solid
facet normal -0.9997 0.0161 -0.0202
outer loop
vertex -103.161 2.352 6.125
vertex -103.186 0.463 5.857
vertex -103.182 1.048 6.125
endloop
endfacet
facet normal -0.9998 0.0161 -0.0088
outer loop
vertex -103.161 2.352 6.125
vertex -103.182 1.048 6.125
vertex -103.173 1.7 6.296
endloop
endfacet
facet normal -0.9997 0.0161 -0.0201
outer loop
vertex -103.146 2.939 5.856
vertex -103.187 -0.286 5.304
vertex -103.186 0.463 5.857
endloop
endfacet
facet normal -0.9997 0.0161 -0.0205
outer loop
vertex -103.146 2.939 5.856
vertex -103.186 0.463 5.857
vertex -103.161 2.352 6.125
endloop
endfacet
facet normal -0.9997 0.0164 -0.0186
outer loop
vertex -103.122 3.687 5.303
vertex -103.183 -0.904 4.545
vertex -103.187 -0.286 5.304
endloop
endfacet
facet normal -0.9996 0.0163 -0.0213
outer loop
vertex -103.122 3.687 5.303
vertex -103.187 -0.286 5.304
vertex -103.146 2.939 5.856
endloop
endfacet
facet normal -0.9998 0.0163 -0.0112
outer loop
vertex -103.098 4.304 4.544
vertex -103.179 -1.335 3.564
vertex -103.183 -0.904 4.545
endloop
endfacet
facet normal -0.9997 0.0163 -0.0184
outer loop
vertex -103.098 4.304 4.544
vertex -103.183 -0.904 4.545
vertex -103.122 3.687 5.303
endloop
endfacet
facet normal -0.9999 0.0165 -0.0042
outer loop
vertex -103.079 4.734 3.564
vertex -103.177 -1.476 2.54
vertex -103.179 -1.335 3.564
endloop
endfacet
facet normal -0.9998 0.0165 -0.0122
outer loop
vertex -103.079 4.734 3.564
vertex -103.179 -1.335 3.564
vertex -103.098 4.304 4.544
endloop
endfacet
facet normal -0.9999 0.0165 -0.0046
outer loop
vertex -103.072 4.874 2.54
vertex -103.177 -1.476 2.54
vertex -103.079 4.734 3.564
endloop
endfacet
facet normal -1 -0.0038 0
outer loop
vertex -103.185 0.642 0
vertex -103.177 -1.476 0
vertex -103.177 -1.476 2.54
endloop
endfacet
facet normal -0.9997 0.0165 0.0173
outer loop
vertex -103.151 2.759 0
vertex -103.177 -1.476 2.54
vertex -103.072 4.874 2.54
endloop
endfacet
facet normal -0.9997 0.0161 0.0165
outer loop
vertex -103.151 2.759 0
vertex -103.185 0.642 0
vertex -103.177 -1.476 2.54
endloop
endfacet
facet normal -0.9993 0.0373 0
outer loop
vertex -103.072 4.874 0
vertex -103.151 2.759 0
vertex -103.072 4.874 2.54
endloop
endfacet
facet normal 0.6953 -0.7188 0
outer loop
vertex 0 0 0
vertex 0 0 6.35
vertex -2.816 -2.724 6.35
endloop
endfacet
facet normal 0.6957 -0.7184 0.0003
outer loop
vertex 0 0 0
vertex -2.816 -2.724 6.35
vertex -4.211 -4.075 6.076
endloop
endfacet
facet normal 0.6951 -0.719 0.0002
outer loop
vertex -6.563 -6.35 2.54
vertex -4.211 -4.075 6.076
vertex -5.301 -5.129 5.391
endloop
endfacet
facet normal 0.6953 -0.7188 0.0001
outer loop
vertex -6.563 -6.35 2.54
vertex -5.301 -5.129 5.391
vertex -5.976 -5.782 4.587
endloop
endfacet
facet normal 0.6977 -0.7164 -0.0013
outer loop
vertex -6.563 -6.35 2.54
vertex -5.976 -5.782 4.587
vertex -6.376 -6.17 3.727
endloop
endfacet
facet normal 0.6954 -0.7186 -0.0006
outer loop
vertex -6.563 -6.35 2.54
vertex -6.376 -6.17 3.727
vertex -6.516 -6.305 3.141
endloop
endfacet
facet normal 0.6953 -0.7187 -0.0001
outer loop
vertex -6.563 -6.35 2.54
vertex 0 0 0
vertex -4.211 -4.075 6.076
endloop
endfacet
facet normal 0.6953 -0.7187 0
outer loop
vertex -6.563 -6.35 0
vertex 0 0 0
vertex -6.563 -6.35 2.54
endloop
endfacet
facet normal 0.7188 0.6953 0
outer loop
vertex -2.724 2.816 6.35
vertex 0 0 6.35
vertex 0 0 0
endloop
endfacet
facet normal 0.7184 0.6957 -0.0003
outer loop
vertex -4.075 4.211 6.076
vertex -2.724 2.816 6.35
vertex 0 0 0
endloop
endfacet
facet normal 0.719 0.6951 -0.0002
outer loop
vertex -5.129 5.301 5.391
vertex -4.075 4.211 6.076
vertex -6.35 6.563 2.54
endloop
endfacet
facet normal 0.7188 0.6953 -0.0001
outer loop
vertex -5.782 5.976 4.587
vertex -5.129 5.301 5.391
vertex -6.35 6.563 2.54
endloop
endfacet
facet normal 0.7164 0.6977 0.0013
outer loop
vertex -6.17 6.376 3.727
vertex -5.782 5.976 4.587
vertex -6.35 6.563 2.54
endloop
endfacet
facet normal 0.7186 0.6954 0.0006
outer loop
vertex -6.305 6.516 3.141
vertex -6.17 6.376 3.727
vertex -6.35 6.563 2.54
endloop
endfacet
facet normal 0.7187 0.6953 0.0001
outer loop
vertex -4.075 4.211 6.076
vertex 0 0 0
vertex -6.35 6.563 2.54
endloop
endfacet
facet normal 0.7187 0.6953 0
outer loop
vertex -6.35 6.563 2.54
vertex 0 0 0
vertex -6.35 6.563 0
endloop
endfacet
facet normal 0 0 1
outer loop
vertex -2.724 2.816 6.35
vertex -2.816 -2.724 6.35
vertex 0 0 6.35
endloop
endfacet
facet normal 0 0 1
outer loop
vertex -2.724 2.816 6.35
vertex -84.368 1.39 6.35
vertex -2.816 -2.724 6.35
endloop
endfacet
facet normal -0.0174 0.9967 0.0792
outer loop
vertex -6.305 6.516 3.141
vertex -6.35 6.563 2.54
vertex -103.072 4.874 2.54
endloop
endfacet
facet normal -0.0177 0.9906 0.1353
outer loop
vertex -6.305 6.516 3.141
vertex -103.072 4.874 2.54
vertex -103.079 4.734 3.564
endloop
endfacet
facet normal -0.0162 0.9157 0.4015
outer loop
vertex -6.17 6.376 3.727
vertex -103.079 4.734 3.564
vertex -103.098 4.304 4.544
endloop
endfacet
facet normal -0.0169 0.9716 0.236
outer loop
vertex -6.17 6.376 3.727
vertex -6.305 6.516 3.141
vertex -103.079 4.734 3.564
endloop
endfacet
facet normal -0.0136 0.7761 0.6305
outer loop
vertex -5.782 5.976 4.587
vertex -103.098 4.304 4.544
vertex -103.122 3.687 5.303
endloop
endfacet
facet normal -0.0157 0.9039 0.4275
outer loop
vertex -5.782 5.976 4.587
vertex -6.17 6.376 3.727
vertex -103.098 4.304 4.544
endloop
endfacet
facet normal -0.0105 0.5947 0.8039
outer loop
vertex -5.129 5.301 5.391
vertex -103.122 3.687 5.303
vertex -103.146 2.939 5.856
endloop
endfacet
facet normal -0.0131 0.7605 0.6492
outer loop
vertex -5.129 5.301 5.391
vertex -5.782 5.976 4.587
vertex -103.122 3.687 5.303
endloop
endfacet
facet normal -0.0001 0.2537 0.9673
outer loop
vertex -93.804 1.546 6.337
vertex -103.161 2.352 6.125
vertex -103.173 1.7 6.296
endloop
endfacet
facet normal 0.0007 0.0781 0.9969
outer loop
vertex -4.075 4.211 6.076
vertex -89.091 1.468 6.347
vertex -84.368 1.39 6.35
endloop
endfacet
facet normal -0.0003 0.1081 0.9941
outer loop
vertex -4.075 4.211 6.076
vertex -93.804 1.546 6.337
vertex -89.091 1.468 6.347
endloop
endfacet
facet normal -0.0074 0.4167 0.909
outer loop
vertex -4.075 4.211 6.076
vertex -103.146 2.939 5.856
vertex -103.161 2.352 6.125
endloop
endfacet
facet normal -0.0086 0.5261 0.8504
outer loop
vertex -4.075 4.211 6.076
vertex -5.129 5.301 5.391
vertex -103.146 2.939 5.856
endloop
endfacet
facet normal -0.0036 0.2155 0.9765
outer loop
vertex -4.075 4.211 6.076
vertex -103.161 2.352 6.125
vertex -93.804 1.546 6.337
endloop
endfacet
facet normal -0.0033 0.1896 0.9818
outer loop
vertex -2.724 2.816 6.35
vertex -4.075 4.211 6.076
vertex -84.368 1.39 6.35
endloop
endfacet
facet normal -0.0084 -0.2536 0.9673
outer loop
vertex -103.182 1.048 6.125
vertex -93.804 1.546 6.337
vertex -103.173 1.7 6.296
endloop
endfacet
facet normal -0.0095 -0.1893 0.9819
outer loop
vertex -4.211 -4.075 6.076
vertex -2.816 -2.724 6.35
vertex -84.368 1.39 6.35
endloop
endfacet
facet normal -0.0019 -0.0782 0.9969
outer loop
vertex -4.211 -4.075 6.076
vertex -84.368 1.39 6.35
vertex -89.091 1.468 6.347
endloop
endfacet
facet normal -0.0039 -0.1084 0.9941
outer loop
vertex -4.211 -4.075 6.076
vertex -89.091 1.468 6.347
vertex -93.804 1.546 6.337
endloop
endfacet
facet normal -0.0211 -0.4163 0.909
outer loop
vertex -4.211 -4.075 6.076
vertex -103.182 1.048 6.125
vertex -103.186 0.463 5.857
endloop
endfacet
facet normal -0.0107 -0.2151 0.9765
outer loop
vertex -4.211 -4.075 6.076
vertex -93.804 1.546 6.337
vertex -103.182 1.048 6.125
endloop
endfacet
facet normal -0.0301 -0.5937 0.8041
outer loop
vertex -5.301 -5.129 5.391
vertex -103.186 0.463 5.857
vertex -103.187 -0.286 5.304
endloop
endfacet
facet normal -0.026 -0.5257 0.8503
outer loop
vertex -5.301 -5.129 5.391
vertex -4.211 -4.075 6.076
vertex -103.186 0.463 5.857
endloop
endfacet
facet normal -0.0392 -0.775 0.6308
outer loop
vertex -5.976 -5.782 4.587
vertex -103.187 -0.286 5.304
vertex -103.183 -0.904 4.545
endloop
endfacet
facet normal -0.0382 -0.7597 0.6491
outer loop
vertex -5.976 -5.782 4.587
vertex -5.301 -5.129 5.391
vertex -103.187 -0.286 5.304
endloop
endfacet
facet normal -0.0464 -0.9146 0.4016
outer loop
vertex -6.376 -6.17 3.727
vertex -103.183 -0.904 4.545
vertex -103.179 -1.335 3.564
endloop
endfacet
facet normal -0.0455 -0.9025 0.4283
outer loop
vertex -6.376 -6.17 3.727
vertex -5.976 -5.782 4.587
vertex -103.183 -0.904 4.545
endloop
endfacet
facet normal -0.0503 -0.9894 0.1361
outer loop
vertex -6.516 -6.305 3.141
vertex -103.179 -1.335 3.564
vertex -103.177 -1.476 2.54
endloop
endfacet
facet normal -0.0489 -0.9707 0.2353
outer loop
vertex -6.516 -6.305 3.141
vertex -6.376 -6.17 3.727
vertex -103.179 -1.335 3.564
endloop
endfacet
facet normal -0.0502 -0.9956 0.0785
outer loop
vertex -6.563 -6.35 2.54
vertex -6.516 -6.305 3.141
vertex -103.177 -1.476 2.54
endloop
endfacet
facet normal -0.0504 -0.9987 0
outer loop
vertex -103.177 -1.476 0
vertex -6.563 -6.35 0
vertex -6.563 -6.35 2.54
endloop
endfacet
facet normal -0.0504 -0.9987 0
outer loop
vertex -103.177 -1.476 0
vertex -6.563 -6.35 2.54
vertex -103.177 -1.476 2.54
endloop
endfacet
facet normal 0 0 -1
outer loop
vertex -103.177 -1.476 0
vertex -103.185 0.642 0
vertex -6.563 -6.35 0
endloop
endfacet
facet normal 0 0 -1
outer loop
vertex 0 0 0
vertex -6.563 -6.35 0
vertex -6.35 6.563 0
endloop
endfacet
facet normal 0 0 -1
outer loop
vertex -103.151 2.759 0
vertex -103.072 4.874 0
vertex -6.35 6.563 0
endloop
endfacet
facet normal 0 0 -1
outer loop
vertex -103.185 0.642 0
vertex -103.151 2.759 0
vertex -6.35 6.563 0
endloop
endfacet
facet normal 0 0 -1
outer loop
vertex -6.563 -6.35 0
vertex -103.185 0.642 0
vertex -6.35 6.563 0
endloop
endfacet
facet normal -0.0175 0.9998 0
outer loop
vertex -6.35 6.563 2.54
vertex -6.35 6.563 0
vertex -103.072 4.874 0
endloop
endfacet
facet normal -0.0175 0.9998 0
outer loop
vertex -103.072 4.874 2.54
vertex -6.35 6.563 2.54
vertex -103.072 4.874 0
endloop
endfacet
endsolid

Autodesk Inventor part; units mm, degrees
ref_plane "YZ Plane" through (0, 0, 0) normal (1, 0, 0) x (0, 1, 0)
ref_plane "XZ Plane" through (0, 0, 0) normal (0, 1, 0) x (-1, 0, 0)
ref_plane "XY Plane" through (0, 0, 0) normal (0, 0, 1) x (1, 0, 0)
sketch "Sketch1" plane through (0, 0, 0) normal (0, 0, 1) x (1, 0, 0)
  line L0 (0, 0) -> (-6.35, 6.5628)
  line L1 (-6.35, 6.5628) -> (-103.0723, 4.8744)
  line L2 (0, 0) -> (-6.5628, -6.35)
  line L3 (-6.5628, -6.35) -> (-103.1769, -1.4756)
  arc A0 (-103.0723, 4.8744) -> (-103.1769, -1.4756) centre (0, 0) ccw
  dimension "d0" = 103.1875
  dimension "d1" = 6.35
  dimension "d2" = 6.35
  dimension "d3" = 133.056
  dimension "d4" = 133.056
extrude "Extrusion1" add sketch "Sketch1" along normal blind 6.35
fillet "Fillet1" radius 3.81 2 edges at (-54.8699, -3.9128, 6.35) (-54.7112, 5.7186, 6.35)
properties part number "Lift_Support"
